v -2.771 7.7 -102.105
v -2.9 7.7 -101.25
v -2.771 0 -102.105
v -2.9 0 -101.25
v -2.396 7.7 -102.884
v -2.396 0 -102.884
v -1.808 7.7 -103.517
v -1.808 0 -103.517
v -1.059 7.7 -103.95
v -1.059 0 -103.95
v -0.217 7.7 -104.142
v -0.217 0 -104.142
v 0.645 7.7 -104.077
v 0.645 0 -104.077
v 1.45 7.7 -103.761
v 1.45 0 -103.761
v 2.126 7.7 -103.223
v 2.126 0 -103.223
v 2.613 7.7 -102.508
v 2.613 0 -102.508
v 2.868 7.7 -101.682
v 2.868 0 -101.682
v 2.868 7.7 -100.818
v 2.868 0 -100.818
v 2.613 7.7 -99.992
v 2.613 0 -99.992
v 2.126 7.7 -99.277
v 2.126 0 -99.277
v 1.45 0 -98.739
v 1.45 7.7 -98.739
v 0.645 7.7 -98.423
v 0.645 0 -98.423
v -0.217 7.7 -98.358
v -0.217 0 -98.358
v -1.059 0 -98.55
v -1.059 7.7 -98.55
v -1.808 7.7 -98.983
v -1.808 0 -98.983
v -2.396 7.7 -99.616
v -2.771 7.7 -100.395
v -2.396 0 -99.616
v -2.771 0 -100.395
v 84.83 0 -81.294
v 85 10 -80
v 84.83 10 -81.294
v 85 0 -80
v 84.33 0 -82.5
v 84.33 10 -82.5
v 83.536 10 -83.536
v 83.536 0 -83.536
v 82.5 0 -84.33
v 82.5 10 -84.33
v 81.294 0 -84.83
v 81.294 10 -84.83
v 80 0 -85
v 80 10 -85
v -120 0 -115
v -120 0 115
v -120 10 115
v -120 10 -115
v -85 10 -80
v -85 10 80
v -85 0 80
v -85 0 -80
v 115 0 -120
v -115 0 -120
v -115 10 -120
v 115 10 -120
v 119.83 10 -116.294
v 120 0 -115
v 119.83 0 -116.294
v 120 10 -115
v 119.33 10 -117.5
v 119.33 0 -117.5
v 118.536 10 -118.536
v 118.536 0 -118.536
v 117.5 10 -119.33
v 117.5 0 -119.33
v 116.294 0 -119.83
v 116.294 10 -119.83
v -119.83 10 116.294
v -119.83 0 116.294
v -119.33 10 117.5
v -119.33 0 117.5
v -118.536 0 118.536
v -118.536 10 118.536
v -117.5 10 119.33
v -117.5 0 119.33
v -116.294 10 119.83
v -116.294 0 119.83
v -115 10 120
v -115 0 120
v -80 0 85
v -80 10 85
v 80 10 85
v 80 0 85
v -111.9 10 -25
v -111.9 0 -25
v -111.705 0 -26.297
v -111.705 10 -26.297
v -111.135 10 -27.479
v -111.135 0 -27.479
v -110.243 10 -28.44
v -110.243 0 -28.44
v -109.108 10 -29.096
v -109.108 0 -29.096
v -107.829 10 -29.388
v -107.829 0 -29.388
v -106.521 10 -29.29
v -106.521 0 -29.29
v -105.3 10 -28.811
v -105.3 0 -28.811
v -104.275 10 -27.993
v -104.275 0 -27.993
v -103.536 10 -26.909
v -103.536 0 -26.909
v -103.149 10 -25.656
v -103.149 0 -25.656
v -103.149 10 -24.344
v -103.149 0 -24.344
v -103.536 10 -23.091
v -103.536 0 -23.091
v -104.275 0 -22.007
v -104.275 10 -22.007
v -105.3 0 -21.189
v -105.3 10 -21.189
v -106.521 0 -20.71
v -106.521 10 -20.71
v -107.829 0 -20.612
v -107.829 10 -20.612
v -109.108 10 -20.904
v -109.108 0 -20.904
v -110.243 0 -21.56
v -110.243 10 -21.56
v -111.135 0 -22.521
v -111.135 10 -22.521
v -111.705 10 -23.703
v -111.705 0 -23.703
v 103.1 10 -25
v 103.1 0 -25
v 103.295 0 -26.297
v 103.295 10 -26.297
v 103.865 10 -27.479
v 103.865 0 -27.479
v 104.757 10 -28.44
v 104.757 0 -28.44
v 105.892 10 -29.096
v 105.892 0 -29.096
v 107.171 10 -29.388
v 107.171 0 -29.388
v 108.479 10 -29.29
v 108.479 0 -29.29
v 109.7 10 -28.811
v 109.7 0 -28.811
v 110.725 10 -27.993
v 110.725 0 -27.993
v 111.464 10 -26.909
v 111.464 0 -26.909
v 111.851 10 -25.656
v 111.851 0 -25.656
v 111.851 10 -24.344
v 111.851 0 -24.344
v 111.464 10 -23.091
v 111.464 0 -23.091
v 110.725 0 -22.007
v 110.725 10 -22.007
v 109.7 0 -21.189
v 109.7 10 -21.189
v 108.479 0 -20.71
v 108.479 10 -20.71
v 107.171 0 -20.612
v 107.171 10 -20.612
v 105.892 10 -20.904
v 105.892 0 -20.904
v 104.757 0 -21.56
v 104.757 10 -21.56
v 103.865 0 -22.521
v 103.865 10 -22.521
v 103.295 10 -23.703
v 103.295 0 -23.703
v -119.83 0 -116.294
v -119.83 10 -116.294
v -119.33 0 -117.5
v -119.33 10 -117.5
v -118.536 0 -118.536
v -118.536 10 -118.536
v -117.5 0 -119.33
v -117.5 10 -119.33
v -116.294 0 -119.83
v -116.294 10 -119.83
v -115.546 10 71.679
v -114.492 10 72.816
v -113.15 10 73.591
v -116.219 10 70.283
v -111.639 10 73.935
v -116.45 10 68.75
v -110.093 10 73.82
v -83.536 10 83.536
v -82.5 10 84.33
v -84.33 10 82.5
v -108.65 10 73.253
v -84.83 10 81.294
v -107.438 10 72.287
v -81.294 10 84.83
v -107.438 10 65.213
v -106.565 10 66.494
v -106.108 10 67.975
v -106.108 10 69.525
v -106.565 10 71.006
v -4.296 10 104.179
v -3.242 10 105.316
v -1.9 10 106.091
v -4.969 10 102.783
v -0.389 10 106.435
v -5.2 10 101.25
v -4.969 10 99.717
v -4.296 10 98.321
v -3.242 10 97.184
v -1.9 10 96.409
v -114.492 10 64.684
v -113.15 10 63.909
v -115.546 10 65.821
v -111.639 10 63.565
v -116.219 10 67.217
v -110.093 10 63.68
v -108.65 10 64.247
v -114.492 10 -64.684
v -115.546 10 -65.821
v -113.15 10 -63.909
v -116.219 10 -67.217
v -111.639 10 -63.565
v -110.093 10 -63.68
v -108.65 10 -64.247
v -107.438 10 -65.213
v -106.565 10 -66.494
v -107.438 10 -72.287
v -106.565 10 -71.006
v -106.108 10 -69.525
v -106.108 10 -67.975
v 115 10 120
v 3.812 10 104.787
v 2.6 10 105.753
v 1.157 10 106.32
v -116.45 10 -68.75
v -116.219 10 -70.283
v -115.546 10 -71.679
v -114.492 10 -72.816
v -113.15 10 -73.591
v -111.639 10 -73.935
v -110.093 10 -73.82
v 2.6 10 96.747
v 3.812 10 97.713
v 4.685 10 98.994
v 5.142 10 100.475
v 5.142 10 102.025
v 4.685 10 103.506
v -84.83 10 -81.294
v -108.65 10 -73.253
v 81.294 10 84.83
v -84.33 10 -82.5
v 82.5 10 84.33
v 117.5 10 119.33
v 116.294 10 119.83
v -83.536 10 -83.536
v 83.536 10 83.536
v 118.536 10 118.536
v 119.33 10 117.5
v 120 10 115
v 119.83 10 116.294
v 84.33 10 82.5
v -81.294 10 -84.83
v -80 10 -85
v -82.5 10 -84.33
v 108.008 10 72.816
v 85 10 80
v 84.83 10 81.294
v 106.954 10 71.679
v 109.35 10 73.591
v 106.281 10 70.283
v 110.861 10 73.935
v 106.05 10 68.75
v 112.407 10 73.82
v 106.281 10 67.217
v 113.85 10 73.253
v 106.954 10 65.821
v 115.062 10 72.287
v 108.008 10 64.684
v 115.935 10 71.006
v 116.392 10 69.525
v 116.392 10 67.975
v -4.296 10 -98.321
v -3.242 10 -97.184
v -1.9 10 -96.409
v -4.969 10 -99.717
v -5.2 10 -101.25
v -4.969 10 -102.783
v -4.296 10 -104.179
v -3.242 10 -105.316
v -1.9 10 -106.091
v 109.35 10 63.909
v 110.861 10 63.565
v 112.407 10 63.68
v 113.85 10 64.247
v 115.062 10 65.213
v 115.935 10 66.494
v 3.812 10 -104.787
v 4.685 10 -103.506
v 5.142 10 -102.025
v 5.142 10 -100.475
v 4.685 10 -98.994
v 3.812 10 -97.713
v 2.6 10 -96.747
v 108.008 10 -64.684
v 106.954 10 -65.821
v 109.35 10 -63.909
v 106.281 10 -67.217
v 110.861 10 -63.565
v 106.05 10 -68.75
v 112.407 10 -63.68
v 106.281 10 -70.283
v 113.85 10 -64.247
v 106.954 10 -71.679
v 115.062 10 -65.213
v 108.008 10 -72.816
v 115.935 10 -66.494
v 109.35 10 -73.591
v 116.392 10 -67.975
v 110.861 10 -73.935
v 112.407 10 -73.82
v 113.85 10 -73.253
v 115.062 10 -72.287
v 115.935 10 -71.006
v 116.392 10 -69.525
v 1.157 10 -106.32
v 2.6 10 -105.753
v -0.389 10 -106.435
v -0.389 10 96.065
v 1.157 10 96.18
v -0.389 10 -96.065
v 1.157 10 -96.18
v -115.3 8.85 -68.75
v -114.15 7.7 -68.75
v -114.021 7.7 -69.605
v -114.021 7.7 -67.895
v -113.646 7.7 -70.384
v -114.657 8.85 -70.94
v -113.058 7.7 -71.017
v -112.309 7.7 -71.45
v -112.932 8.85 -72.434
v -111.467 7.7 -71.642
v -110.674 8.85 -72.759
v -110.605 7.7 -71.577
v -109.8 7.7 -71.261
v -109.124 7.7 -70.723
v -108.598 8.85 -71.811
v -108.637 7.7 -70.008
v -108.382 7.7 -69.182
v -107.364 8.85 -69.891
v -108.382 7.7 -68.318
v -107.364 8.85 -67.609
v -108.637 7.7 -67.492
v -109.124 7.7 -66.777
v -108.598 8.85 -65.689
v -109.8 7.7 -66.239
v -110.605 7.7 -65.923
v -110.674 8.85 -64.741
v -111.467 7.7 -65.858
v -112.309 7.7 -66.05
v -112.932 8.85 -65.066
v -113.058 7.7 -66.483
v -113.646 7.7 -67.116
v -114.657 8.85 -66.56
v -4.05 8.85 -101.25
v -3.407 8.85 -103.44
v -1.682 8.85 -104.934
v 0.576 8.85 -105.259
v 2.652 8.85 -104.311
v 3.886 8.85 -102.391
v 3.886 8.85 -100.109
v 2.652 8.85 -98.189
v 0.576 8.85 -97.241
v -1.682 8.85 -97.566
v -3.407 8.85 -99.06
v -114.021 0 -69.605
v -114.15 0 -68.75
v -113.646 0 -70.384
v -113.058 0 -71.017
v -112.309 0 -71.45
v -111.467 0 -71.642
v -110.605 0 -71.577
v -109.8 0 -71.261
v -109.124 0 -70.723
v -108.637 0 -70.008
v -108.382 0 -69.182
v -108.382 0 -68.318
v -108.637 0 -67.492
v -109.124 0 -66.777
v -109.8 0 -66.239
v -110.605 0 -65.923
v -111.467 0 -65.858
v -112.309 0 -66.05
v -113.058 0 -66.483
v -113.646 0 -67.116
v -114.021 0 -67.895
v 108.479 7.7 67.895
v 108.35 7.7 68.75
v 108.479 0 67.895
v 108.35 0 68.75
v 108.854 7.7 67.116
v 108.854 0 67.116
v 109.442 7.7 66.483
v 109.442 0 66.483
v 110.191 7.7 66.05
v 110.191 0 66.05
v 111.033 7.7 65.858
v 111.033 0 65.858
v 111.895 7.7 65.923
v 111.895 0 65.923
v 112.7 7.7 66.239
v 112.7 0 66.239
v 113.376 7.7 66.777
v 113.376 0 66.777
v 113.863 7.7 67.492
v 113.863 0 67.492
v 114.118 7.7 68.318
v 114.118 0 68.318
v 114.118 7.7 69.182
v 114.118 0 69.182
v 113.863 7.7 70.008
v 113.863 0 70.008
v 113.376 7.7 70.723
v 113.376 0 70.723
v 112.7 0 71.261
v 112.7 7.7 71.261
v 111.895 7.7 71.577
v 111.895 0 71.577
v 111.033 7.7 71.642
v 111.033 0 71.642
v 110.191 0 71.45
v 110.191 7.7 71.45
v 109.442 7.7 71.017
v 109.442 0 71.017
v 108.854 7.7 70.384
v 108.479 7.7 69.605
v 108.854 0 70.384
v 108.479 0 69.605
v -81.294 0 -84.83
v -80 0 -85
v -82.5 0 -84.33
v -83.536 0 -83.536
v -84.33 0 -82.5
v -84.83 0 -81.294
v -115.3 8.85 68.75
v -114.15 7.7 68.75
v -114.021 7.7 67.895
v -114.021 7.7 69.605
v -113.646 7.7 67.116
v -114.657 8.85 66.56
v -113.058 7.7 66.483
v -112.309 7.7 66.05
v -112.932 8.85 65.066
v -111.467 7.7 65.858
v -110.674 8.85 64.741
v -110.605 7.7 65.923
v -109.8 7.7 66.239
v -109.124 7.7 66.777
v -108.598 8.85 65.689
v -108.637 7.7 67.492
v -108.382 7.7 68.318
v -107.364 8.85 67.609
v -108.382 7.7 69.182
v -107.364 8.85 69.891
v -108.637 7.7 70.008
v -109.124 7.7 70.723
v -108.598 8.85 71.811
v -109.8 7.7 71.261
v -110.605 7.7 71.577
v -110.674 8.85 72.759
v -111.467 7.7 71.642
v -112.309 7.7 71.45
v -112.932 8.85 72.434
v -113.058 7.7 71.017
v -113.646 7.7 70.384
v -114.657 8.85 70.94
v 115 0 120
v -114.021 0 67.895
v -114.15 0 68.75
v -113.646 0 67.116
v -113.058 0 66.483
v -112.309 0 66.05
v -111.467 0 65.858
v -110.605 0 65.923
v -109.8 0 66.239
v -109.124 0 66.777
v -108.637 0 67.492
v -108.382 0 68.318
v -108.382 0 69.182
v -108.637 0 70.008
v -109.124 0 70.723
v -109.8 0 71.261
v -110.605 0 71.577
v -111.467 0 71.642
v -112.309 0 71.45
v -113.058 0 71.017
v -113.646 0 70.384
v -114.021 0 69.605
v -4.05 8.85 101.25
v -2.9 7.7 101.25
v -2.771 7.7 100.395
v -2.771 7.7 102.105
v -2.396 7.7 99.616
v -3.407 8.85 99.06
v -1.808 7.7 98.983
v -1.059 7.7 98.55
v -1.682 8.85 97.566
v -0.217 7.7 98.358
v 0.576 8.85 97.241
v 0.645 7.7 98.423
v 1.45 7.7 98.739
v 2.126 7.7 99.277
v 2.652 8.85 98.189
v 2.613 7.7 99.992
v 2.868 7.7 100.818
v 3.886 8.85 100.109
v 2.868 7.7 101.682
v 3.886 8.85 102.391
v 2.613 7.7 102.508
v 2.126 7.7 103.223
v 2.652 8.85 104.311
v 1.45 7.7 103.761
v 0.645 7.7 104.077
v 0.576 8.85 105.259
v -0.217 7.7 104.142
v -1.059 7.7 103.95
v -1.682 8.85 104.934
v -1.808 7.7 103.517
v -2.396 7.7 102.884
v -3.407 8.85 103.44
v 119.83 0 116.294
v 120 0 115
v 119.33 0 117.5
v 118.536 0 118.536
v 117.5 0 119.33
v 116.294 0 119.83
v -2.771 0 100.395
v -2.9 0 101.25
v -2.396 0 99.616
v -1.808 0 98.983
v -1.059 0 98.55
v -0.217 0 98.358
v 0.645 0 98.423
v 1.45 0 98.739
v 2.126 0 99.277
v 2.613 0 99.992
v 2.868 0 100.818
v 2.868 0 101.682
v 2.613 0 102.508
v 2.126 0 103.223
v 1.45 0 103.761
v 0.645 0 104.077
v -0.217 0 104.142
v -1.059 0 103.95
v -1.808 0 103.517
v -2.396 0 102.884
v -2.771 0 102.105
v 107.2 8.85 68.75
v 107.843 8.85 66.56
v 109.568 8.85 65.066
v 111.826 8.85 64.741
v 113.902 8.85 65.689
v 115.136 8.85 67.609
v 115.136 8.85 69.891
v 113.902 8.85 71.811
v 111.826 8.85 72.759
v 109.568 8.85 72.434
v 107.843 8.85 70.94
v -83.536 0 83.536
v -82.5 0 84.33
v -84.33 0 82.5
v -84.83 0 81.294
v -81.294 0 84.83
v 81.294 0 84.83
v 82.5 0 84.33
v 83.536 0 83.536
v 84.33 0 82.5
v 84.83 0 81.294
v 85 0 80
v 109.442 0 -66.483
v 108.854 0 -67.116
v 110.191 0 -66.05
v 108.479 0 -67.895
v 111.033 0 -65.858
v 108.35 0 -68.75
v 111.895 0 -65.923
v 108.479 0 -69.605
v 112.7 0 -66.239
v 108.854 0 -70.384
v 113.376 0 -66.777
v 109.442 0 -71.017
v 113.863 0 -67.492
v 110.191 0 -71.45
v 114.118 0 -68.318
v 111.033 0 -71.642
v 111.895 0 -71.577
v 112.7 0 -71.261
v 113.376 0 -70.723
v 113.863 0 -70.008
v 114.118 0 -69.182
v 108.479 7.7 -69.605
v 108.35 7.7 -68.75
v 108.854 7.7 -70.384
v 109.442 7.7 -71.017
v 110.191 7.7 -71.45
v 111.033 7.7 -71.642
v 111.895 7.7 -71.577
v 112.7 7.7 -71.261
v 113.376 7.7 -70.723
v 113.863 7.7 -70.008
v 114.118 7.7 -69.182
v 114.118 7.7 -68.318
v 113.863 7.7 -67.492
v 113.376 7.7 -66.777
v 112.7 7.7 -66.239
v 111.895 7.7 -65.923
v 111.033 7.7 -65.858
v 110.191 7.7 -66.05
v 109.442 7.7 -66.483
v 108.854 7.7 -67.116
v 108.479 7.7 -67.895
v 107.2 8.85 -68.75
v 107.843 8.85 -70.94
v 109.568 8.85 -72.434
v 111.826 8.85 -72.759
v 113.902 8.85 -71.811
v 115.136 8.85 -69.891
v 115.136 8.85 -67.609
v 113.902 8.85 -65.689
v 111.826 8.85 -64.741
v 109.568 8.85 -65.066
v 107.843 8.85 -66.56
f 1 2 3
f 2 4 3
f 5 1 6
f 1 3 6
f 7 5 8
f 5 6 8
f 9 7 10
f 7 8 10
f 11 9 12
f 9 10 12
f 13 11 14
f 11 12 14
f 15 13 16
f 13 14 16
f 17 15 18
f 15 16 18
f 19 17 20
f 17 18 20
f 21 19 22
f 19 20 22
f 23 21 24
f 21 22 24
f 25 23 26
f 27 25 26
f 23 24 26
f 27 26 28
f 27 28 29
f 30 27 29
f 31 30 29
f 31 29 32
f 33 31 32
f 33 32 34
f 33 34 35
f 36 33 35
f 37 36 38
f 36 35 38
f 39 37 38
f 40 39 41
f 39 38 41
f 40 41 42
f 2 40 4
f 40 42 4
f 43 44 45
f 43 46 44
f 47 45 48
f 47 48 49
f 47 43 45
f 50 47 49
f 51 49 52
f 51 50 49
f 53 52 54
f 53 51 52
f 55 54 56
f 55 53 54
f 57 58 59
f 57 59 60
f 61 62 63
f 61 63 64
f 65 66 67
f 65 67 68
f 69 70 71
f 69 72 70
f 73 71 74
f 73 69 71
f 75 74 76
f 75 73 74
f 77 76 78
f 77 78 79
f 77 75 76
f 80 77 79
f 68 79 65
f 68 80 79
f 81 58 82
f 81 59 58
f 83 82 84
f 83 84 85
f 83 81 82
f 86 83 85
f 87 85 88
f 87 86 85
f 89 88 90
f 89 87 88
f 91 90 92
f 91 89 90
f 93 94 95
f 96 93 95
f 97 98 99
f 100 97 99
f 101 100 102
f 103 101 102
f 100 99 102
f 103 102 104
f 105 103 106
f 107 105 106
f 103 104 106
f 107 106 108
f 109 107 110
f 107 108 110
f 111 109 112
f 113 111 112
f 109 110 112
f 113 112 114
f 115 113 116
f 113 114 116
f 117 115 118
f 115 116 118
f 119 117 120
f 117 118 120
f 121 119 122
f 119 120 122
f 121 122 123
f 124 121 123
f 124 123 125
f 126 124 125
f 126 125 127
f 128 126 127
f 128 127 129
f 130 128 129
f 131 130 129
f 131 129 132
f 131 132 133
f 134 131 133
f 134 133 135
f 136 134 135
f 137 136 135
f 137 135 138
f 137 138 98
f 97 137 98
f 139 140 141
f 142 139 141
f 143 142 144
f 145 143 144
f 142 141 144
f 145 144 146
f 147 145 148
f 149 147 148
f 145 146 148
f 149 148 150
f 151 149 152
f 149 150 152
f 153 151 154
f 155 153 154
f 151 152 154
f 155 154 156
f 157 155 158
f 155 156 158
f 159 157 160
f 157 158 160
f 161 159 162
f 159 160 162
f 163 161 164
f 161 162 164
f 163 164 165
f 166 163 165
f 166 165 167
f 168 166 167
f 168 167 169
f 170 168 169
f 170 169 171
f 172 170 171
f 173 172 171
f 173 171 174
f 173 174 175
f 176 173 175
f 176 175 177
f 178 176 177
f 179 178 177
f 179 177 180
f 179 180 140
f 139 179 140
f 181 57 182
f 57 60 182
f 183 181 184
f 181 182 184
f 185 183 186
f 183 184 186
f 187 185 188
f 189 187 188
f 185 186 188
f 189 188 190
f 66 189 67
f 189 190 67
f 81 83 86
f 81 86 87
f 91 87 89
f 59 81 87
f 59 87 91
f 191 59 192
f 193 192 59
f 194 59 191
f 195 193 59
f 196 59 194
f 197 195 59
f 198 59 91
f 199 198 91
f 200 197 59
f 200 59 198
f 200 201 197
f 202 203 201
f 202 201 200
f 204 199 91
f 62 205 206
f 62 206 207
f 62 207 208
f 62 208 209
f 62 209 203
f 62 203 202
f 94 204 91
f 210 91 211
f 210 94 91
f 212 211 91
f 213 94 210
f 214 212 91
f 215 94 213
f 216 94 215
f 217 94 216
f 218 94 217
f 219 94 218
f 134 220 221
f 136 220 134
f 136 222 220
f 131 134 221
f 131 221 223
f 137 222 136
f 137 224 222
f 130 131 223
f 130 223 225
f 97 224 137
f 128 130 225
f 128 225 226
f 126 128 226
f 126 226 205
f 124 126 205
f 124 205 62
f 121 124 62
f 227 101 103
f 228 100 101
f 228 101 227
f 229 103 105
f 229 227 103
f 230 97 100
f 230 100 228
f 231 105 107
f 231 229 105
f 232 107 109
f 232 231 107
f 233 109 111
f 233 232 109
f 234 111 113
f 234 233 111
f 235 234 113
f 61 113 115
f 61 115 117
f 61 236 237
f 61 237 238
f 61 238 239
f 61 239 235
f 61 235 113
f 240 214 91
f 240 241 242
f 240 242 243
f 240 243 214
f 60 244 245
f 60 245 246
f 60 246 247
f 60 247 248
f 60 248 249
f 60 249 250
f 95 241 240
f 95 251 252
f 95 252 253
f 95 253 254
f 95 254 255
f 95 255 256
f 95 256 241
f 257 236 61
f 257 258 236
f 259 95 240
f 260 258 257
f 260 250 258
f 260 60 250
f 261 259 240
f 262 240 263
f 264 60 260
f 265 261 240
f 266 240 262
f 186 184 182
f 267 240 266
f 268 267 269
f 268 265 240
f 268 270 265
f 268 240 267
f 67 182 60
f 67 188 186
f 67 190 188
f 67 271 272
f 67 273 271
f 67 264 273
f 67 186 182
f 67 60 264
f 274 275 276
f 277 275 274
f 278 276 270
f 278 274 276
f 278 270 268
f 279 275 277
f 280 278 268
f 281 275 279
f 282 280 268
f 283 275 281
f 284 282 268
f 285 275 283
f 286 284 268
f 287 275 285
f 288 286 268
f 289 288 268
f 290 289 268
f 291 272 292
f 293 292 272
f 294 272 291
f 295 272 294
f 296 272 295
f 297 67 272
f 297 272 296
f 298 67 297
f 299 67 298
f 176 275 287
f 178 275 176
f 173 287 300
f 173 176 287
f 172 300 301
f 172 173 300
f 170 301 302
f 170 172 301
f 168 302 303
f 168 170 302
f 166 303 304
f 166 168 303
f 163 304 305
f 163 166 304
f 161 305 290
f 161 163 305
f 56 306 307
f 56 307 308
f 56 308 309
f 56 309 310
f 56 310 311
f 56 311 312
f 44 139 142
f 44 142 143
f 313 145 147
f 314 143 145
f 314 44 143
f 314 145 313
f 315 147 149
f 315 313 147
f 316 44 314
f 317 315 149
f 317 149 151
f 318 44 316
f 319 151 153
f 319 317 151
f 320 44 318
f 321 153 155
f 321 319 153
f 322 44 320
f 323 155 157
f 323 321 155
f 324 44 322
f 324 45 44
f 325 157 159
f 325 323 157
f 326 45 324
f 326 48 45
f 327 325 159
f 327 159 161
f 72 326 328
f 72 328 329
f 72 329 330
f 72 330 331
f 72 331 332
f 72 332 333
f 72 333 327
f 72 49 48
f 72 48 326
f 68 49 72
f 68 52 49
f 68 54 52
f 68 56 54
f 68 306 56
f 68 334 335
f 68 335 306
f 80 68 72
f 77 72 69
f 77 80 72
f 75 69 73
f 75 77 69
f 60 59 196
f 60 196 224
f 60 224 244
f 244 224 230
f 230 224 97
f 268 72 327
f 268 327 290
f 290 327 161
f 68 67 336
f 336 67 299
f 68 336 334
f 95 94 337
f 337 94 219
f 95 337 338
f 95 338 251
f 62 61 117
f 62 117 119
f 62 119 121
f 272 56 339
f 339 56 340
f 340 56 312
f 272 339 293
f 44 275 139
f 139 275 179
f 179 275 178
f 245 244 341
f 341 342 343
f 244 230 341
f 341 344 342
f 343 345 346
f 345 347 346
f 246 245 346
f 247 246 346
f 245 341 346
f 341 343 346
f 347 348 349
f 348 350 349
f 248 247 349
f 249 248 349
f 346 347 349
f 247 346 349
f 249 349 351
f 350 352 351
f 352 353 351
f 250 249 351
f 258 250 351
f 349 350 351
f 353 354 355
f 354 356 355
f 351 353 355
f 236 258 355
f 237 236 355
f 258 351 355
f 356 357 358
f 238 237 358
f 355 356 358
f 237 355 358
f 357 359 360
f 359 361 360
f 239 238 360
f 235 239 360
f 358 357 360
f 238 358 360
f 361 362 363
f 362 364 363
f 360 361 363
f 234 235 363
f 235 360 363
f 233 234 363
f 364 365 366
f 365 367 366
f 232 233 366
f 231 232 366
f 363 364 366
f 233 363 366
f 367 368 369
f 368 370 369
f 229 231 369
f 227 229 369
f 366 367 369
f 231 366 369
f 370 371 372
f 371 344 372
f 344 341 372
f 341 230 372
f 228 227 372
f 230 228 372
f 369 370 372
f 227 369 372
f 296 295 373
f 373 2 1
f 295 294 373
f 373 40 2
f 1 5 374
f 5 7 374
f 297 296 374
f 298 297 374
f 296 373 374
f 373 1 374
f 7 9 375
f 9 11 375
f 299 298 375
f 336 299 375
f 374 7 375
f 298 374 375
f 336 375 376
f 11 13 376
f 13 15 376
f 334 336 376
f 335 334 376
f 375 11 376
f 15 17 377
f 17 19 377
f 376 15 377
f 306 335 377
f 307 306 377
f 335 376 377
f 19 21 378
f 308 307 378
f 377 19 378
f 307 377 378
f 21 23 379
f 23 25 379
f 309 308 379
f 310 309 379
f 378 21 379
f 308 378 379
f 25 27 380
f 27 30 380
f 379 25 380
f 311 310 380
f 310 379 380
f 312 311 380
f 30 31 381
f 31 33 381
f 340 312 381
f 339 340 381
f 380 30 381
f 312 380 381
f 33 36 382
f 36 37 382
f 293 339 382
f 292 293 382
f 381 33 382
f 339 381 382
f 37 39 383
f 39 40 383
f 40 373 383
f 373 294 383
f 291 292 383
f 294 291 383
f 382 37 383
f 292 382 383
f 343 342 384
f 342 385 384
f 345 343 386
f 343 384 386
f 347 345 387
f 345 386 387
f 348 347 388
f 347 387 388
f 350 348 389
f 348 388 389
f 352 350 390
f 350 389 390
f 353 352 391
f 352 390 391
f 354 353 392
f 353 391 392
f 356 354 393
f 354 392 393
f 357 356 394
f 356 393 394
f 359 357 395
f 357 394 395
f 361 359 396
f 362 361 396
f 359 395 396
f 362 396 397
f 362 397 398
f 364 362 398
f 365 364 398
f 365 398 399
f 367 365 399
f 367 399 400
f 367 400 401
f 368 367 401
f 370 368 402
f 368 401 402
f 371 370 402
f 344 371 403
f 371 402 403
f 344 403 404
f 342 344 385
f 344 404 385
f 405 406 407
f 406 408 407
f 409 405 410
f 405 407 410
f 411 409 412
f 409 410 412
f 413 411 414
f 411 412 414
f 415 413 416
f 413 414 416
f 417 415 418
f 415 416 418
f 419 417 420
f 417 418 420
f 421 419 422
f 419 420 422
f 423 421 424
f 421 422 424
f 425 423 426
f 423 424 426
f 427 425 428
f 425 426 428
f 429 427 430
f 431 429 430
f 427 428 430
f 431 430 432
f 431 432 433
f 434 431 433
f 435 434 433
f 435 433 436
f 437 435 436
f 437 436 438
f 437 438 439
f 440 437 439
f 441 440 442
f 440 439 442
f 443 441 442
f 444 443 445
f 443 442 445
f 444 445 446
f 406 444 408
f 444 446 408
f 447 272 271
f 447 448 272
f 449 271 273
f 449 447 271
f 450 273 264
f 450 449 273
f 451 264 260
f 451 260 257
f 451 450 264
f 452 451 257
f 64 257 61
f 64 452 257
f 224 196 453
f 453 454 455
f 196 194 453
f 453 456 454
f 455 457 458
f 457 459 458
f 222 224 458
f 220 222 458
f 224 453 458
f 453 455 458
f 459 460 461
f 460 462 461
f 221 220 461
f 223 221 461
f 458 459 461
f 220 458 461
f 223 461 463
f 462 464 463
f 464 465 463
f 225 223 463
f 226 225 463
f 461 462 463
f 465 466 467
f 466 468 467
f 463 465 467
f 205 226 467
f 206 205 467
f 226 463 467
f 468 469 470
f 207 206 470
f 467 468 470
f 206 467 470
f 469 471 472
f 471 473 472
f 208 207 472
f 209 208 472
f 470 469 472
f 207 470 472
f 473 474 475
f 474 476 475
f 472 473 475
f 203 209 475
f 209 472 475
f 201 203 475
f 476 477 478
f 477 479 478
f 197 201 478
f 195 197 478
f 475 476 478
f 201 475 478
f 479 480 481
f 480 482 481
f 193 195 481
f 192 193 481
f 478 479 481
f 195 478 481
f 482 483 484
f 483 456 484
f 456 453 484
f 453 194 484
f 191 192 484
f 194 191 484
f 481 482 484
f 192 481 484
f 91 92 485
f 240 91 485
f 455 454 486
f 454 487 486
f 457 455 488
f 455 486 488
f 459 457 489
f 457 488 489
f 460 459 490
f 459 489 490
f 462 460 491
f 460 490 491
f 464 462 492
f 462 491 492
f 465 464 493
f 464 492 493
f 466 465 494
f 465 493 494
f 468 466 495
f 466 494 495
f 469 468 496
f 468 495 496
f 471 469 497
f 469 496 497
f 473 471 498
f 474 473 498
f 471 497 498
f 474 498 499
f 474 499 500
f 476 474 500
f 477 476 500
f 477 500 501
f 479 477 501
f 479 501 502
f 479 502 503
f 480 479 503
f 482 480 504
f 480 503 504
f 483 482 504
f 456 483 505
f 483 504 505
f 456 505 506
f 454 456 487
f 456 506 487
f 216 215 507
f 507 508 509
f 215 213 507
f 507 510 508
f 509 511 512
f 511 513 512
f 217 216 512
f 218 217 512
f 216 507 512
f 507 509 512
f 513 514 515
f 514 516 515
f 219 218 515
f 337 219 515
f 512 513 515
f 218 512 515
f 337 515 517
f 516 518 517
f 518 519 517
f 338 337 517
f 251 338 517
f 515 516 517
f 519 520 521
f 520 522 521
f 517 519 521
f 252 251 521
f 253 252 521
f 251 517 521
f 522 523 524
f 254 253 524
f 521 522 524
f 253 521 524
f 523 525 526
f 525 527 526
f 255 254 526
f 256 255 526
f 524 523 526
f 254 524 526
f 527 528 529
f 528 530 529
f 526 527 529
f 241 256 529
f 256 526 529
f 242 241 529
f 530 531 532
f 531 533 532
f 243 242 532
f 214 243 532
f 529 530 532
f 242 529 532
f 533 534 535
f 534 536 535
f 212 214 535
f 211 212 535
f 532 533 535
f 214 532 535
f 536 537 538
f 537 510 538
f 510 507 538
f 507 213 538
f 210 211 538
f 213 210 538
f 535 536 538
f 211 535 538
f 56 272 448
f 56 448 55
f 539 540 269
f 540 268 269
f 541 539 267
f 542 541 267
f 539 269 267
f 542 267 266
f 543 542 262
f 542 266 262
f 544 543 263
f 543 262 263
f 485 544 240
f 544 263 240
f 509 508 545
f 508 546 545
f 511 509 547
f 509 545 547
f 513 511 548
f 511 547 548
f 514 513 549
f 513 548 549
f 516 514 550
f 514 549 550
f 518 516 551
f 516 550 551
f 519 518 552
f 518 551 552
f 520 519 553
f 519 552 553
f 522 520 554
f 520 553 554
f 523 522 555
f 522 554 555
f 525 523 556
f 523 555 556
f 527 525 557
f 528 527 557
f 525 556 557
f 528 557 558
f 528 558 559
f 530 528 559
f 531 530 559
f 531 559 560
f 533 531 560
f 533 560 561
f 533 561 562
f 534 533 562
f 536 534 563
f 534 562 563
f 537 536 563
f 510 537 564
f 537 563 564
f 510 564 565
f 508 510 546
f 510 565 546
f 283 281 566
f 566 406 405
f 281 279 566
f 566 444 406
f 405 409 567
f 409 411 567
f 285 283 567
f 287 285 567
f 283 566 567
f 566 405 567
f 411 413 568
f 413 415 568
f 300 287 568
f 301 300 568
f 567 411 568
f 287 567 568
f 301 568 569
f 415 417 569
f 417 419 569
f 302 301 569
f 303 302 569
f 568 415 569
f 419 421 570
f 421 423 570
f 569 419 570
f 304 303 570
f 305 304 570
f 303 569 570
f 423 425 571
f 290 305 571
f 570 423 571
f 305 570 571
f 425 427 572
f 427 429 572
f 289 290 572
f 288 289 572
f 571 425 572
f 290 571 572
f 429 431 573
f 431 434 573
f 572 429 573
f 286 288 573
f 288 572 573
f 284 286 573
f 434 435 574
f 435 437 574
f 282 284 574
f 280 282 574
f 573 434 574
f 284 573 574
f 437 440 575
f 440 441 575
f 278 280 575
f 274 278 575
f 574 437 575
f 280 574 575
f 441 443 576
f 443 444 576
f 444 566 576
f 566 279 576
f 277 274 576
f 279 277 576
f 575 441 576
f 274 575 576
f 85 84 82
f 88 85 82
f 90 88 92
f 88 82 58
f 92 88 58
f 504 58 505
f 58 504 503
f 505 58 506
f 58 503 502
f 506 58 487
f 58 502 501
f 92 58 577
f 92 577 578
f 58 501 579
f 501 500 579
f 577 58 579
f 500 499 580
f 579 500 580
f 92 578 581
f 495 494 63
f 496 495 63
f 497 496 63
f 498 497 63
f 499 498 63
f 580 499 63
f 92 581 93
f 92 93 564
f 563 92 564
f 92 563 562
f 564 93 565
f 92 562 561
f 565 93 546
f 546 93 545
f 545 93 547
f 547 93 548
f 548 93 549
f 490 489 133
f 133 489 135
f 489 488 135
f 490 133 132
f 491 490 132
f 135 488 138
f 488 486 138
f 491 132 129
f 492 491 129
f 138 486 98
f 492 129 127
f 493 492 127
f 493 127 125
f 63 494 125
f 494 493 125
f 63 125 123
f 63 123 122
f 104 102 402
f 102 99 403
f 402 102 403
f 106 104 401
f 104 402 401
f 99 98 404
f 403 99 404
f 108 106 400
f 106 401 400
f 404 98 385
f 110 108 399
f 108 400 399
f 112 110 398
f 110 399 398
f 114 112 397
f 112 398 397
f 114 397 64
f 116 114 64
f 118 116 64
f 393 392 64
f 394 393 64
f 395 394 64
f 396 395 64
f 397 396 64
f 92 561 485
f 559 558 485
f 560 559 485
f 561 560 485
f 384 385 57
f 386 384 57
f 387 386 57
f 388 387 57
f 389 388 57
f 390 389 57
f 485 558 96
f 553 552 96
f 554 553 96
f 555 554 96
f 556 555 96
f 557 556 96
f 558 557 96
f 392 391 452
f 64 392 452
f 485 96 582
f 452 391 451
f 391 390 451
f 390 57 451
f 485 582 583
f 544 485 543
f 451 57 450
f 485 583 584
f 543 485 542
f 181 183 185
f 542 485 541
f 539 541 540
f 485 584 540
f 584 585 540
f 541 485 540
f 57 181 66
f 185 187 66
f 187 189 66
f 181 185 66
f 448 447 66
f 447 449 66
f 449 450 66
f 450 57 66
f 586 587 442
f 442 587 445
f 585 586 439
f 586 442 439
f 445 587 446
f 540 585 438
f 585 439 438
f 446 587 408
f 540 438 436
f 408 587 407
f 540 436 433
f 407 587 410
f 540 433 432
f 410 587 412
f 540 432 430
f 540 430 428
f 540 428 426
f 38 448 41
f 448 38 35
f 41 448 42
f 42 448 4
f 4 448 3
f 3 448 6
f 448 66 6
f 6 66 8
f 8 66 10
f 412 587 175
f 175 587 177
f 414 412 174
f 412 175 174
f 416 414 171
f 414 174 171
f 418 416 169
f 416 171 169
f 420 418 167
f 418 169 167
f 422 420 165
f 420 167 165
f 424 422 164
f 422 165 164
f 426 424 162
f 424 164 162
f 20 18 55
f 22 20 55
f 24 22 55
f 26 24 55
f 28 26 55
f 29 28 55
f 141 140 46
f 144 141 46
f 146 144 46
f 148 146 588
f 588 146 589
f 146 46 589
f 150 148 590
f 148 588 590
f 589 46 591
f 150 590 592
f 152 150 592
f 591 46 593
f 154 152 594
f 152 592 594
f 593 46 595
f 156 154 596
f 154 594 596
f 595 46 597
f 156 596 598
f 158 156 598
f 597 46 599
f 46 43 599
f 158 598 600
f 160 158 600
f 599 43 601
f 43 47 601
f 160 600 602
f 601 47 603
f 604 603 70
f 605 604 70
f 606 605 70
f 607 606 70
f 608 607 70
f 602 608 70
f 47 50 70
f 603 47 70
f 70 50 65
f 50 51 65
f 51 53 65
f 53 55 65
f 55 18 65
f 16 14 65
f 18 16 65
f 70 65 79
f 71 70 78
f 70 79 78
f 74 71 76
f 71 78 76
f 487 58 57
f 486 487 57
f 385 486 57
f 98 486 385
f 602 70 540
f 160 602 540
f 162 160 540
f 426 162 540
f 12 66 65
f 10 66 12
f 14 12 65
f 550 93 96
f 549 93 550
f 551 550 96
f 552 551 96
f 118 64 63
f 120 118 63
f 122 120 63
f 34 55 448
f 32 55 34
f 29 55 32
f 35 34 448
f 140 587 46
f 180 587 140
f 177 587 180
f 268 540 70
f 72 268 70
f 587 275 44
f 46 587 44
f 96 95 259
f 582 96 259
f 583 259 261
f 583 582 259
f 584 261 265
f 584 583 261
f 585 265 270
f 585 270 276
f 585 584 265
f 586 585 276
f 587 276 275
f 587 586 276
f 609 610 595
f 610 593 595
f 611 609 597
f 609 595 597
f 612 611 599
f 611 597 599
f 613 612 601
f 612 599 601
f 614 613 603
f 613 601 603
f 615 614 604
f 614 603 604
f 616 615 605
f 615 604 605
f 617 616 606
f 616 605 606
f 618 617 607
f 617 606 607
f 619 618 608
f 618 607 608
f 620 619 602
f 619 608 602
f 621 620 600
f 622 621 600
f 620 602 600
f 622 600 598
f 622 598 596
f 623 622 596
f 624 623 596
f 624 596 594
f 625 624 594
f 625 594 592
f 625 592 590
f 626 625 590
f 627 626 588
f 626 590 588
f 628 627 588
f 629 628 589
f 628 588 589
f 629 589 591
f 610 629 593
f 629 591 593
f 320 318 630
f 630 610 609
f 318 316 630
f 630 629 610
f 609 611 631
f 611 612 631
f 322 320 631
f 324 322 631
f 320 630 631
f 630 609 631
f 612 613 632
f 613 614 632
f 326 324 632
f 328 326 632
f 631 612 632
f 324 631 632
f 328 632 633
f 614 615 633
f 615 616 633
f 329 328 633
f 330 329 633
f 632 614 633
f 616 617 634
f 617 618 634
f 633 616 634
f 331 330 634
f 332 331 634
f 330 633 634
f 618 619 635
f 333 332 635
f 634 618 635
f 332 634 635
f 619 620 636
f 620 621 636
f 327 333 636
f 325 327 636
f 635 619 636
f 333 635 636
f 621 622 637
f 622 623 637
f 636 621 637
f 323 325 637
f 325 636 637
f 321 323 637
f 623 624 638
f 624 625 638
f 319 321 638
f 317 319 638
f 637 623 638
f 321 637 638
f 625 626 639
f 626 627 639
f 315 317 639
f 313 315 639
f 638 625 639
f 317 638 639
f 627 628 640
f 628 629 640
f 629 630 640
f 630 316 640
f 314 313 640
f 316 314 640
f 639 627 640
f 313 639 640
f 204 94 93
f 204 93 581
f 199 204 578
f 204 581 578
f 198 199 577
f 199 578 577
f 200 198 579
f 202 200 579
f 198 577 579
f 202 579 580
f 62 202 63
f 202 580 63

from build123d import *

# Parameters (mm, degrees)
SKETCH1_W                                       = 240
SKETCH1_H                                       = 240
BOSS_EXTRUDE1_DEPTH                             = 10
CSK_FOR_M5_FLAT_HEAD_MACHINE_SCREW1_D           = 5.8
CSK_FOR_M5_FLAT_HEAD_MACHINE_SCREW1_CSINK_D     = 10.4
CSK_FOR_M5_FLAT_HEAD_MACHINE_SCREW1_CSINK_ANGLE = 90
FILLET1_R                                       = 5
TAP_DRILL_FOR_M10X1_25_TAP1_D                   = 8.8
TAP_DRILL_FOR_M10X1_25_TAP1_DEPTH               = 19.75
TAP_DRILL_FOR_M10X1_25_TAP1_TIP                 = 2.643786724
SKETCH8_W                                       = 170
SKETCH8_H                                       = 170
CUT_EXTRUDE1_DEPTH                              = 10
FILLET2_R                                       = 5


with BuildPart() as part:
    # Sketch1 → Boss-Extrude1 (new body)
    with BuildSketch(Plane(origin=(0, 0, 0), x_dir=(1, 0, 0), z_dir=(0, 1, 0))):
        Rectangle(SKETCH1_W, SKETCH1_H)
    extrude(amount=BOSS_EXTRUDE1_DEPTH)

    # CSK for M5 Flat Head Machine Screw1 (through all)
    with Locations(Plane(origin=(0, 10, 0), x_dir=(1, 0, 0), z_dir=(0, 1, 0))):
        with Locations((-111.25, 68.75), (0, 101.25), (111.25, 68.75), (111.25, -68.75), (0, -101.25), (-111.25, -68.75)):
            CounterSinkHole(CSK_FOR_M5_FLAT_HEAD_MACHINE_SCREW1_D / 2, CSK_FOR_M5_FLAT_HEAD_MACHINE_SCREW1_CSINK_D / 2, counter_sink_angle=CSK_FOR_M5_FLAT_HEAD_MACHINE_SCREW1_CSINK_ANGLE)

    # Fillet1
    fillet1_edges = [part.edges().sort_by_distance(p)[0] for p in [
        (120, 5, 120),
        (-120, 5, 120),
        (-120, 5, -120),
        (120, 5, -120),
    ]]
    fillet(fillet1_edges, radius=FILLET1_R)

    # Tap Drill for M10x1.25 Tap1
    with Locations(Plane(origin=(0, 10, 0), x_dir=(1, 0, 0), z_dir=(0, 1, 0))):
        with Locations((107.5, 25), (-107.5, 25)):
            Hole(TAP_DRILL_FOR_M10X1_25_TAP1_D / 2, depth=TAP_DRILL_FOR_M10X1_25_TAP1_DEPTH)
            with Locations((0, 0, -(TAP_DRILL_FOR_M10X1_25_TAP1_DEPTH + TAP_DRILL_FOR_M10X1_25_TAP1_TIP / 2))):  # 118° drill point
                Cone(0, TAP_DRILL_FOR_M10X1_25_TAP1_D / 2, TAP_DRILL_FOR_M10X1_25_TAP1_TIP, mode=Mode.SUBTRACT)

    # Sketch8 → Cut-Extrude1 (cut)
    with BuildSketch(Plane(origin=(0, 10, 0), x_dir=(1, 0, 0), z_dir=(0, 1, 0))):
        Rectangle(SKETCH8_W, SKETCH8_H)
    extrude(amount=-CUT_EXTRUDE1_DEPTH, mode=Mode.SUBTRACT)

    # Fillet2
    fillet2_edges = [part.edges().sort_by_distance(p)[0] for p in [
        (-85, 5, -85),
        (85, 5, -85),
        (85, 5, 85),
        (-85, 5, 85),
    ]]
    fillet(fillet2_edges, radius=FILLET2_R)


solid = part.part
